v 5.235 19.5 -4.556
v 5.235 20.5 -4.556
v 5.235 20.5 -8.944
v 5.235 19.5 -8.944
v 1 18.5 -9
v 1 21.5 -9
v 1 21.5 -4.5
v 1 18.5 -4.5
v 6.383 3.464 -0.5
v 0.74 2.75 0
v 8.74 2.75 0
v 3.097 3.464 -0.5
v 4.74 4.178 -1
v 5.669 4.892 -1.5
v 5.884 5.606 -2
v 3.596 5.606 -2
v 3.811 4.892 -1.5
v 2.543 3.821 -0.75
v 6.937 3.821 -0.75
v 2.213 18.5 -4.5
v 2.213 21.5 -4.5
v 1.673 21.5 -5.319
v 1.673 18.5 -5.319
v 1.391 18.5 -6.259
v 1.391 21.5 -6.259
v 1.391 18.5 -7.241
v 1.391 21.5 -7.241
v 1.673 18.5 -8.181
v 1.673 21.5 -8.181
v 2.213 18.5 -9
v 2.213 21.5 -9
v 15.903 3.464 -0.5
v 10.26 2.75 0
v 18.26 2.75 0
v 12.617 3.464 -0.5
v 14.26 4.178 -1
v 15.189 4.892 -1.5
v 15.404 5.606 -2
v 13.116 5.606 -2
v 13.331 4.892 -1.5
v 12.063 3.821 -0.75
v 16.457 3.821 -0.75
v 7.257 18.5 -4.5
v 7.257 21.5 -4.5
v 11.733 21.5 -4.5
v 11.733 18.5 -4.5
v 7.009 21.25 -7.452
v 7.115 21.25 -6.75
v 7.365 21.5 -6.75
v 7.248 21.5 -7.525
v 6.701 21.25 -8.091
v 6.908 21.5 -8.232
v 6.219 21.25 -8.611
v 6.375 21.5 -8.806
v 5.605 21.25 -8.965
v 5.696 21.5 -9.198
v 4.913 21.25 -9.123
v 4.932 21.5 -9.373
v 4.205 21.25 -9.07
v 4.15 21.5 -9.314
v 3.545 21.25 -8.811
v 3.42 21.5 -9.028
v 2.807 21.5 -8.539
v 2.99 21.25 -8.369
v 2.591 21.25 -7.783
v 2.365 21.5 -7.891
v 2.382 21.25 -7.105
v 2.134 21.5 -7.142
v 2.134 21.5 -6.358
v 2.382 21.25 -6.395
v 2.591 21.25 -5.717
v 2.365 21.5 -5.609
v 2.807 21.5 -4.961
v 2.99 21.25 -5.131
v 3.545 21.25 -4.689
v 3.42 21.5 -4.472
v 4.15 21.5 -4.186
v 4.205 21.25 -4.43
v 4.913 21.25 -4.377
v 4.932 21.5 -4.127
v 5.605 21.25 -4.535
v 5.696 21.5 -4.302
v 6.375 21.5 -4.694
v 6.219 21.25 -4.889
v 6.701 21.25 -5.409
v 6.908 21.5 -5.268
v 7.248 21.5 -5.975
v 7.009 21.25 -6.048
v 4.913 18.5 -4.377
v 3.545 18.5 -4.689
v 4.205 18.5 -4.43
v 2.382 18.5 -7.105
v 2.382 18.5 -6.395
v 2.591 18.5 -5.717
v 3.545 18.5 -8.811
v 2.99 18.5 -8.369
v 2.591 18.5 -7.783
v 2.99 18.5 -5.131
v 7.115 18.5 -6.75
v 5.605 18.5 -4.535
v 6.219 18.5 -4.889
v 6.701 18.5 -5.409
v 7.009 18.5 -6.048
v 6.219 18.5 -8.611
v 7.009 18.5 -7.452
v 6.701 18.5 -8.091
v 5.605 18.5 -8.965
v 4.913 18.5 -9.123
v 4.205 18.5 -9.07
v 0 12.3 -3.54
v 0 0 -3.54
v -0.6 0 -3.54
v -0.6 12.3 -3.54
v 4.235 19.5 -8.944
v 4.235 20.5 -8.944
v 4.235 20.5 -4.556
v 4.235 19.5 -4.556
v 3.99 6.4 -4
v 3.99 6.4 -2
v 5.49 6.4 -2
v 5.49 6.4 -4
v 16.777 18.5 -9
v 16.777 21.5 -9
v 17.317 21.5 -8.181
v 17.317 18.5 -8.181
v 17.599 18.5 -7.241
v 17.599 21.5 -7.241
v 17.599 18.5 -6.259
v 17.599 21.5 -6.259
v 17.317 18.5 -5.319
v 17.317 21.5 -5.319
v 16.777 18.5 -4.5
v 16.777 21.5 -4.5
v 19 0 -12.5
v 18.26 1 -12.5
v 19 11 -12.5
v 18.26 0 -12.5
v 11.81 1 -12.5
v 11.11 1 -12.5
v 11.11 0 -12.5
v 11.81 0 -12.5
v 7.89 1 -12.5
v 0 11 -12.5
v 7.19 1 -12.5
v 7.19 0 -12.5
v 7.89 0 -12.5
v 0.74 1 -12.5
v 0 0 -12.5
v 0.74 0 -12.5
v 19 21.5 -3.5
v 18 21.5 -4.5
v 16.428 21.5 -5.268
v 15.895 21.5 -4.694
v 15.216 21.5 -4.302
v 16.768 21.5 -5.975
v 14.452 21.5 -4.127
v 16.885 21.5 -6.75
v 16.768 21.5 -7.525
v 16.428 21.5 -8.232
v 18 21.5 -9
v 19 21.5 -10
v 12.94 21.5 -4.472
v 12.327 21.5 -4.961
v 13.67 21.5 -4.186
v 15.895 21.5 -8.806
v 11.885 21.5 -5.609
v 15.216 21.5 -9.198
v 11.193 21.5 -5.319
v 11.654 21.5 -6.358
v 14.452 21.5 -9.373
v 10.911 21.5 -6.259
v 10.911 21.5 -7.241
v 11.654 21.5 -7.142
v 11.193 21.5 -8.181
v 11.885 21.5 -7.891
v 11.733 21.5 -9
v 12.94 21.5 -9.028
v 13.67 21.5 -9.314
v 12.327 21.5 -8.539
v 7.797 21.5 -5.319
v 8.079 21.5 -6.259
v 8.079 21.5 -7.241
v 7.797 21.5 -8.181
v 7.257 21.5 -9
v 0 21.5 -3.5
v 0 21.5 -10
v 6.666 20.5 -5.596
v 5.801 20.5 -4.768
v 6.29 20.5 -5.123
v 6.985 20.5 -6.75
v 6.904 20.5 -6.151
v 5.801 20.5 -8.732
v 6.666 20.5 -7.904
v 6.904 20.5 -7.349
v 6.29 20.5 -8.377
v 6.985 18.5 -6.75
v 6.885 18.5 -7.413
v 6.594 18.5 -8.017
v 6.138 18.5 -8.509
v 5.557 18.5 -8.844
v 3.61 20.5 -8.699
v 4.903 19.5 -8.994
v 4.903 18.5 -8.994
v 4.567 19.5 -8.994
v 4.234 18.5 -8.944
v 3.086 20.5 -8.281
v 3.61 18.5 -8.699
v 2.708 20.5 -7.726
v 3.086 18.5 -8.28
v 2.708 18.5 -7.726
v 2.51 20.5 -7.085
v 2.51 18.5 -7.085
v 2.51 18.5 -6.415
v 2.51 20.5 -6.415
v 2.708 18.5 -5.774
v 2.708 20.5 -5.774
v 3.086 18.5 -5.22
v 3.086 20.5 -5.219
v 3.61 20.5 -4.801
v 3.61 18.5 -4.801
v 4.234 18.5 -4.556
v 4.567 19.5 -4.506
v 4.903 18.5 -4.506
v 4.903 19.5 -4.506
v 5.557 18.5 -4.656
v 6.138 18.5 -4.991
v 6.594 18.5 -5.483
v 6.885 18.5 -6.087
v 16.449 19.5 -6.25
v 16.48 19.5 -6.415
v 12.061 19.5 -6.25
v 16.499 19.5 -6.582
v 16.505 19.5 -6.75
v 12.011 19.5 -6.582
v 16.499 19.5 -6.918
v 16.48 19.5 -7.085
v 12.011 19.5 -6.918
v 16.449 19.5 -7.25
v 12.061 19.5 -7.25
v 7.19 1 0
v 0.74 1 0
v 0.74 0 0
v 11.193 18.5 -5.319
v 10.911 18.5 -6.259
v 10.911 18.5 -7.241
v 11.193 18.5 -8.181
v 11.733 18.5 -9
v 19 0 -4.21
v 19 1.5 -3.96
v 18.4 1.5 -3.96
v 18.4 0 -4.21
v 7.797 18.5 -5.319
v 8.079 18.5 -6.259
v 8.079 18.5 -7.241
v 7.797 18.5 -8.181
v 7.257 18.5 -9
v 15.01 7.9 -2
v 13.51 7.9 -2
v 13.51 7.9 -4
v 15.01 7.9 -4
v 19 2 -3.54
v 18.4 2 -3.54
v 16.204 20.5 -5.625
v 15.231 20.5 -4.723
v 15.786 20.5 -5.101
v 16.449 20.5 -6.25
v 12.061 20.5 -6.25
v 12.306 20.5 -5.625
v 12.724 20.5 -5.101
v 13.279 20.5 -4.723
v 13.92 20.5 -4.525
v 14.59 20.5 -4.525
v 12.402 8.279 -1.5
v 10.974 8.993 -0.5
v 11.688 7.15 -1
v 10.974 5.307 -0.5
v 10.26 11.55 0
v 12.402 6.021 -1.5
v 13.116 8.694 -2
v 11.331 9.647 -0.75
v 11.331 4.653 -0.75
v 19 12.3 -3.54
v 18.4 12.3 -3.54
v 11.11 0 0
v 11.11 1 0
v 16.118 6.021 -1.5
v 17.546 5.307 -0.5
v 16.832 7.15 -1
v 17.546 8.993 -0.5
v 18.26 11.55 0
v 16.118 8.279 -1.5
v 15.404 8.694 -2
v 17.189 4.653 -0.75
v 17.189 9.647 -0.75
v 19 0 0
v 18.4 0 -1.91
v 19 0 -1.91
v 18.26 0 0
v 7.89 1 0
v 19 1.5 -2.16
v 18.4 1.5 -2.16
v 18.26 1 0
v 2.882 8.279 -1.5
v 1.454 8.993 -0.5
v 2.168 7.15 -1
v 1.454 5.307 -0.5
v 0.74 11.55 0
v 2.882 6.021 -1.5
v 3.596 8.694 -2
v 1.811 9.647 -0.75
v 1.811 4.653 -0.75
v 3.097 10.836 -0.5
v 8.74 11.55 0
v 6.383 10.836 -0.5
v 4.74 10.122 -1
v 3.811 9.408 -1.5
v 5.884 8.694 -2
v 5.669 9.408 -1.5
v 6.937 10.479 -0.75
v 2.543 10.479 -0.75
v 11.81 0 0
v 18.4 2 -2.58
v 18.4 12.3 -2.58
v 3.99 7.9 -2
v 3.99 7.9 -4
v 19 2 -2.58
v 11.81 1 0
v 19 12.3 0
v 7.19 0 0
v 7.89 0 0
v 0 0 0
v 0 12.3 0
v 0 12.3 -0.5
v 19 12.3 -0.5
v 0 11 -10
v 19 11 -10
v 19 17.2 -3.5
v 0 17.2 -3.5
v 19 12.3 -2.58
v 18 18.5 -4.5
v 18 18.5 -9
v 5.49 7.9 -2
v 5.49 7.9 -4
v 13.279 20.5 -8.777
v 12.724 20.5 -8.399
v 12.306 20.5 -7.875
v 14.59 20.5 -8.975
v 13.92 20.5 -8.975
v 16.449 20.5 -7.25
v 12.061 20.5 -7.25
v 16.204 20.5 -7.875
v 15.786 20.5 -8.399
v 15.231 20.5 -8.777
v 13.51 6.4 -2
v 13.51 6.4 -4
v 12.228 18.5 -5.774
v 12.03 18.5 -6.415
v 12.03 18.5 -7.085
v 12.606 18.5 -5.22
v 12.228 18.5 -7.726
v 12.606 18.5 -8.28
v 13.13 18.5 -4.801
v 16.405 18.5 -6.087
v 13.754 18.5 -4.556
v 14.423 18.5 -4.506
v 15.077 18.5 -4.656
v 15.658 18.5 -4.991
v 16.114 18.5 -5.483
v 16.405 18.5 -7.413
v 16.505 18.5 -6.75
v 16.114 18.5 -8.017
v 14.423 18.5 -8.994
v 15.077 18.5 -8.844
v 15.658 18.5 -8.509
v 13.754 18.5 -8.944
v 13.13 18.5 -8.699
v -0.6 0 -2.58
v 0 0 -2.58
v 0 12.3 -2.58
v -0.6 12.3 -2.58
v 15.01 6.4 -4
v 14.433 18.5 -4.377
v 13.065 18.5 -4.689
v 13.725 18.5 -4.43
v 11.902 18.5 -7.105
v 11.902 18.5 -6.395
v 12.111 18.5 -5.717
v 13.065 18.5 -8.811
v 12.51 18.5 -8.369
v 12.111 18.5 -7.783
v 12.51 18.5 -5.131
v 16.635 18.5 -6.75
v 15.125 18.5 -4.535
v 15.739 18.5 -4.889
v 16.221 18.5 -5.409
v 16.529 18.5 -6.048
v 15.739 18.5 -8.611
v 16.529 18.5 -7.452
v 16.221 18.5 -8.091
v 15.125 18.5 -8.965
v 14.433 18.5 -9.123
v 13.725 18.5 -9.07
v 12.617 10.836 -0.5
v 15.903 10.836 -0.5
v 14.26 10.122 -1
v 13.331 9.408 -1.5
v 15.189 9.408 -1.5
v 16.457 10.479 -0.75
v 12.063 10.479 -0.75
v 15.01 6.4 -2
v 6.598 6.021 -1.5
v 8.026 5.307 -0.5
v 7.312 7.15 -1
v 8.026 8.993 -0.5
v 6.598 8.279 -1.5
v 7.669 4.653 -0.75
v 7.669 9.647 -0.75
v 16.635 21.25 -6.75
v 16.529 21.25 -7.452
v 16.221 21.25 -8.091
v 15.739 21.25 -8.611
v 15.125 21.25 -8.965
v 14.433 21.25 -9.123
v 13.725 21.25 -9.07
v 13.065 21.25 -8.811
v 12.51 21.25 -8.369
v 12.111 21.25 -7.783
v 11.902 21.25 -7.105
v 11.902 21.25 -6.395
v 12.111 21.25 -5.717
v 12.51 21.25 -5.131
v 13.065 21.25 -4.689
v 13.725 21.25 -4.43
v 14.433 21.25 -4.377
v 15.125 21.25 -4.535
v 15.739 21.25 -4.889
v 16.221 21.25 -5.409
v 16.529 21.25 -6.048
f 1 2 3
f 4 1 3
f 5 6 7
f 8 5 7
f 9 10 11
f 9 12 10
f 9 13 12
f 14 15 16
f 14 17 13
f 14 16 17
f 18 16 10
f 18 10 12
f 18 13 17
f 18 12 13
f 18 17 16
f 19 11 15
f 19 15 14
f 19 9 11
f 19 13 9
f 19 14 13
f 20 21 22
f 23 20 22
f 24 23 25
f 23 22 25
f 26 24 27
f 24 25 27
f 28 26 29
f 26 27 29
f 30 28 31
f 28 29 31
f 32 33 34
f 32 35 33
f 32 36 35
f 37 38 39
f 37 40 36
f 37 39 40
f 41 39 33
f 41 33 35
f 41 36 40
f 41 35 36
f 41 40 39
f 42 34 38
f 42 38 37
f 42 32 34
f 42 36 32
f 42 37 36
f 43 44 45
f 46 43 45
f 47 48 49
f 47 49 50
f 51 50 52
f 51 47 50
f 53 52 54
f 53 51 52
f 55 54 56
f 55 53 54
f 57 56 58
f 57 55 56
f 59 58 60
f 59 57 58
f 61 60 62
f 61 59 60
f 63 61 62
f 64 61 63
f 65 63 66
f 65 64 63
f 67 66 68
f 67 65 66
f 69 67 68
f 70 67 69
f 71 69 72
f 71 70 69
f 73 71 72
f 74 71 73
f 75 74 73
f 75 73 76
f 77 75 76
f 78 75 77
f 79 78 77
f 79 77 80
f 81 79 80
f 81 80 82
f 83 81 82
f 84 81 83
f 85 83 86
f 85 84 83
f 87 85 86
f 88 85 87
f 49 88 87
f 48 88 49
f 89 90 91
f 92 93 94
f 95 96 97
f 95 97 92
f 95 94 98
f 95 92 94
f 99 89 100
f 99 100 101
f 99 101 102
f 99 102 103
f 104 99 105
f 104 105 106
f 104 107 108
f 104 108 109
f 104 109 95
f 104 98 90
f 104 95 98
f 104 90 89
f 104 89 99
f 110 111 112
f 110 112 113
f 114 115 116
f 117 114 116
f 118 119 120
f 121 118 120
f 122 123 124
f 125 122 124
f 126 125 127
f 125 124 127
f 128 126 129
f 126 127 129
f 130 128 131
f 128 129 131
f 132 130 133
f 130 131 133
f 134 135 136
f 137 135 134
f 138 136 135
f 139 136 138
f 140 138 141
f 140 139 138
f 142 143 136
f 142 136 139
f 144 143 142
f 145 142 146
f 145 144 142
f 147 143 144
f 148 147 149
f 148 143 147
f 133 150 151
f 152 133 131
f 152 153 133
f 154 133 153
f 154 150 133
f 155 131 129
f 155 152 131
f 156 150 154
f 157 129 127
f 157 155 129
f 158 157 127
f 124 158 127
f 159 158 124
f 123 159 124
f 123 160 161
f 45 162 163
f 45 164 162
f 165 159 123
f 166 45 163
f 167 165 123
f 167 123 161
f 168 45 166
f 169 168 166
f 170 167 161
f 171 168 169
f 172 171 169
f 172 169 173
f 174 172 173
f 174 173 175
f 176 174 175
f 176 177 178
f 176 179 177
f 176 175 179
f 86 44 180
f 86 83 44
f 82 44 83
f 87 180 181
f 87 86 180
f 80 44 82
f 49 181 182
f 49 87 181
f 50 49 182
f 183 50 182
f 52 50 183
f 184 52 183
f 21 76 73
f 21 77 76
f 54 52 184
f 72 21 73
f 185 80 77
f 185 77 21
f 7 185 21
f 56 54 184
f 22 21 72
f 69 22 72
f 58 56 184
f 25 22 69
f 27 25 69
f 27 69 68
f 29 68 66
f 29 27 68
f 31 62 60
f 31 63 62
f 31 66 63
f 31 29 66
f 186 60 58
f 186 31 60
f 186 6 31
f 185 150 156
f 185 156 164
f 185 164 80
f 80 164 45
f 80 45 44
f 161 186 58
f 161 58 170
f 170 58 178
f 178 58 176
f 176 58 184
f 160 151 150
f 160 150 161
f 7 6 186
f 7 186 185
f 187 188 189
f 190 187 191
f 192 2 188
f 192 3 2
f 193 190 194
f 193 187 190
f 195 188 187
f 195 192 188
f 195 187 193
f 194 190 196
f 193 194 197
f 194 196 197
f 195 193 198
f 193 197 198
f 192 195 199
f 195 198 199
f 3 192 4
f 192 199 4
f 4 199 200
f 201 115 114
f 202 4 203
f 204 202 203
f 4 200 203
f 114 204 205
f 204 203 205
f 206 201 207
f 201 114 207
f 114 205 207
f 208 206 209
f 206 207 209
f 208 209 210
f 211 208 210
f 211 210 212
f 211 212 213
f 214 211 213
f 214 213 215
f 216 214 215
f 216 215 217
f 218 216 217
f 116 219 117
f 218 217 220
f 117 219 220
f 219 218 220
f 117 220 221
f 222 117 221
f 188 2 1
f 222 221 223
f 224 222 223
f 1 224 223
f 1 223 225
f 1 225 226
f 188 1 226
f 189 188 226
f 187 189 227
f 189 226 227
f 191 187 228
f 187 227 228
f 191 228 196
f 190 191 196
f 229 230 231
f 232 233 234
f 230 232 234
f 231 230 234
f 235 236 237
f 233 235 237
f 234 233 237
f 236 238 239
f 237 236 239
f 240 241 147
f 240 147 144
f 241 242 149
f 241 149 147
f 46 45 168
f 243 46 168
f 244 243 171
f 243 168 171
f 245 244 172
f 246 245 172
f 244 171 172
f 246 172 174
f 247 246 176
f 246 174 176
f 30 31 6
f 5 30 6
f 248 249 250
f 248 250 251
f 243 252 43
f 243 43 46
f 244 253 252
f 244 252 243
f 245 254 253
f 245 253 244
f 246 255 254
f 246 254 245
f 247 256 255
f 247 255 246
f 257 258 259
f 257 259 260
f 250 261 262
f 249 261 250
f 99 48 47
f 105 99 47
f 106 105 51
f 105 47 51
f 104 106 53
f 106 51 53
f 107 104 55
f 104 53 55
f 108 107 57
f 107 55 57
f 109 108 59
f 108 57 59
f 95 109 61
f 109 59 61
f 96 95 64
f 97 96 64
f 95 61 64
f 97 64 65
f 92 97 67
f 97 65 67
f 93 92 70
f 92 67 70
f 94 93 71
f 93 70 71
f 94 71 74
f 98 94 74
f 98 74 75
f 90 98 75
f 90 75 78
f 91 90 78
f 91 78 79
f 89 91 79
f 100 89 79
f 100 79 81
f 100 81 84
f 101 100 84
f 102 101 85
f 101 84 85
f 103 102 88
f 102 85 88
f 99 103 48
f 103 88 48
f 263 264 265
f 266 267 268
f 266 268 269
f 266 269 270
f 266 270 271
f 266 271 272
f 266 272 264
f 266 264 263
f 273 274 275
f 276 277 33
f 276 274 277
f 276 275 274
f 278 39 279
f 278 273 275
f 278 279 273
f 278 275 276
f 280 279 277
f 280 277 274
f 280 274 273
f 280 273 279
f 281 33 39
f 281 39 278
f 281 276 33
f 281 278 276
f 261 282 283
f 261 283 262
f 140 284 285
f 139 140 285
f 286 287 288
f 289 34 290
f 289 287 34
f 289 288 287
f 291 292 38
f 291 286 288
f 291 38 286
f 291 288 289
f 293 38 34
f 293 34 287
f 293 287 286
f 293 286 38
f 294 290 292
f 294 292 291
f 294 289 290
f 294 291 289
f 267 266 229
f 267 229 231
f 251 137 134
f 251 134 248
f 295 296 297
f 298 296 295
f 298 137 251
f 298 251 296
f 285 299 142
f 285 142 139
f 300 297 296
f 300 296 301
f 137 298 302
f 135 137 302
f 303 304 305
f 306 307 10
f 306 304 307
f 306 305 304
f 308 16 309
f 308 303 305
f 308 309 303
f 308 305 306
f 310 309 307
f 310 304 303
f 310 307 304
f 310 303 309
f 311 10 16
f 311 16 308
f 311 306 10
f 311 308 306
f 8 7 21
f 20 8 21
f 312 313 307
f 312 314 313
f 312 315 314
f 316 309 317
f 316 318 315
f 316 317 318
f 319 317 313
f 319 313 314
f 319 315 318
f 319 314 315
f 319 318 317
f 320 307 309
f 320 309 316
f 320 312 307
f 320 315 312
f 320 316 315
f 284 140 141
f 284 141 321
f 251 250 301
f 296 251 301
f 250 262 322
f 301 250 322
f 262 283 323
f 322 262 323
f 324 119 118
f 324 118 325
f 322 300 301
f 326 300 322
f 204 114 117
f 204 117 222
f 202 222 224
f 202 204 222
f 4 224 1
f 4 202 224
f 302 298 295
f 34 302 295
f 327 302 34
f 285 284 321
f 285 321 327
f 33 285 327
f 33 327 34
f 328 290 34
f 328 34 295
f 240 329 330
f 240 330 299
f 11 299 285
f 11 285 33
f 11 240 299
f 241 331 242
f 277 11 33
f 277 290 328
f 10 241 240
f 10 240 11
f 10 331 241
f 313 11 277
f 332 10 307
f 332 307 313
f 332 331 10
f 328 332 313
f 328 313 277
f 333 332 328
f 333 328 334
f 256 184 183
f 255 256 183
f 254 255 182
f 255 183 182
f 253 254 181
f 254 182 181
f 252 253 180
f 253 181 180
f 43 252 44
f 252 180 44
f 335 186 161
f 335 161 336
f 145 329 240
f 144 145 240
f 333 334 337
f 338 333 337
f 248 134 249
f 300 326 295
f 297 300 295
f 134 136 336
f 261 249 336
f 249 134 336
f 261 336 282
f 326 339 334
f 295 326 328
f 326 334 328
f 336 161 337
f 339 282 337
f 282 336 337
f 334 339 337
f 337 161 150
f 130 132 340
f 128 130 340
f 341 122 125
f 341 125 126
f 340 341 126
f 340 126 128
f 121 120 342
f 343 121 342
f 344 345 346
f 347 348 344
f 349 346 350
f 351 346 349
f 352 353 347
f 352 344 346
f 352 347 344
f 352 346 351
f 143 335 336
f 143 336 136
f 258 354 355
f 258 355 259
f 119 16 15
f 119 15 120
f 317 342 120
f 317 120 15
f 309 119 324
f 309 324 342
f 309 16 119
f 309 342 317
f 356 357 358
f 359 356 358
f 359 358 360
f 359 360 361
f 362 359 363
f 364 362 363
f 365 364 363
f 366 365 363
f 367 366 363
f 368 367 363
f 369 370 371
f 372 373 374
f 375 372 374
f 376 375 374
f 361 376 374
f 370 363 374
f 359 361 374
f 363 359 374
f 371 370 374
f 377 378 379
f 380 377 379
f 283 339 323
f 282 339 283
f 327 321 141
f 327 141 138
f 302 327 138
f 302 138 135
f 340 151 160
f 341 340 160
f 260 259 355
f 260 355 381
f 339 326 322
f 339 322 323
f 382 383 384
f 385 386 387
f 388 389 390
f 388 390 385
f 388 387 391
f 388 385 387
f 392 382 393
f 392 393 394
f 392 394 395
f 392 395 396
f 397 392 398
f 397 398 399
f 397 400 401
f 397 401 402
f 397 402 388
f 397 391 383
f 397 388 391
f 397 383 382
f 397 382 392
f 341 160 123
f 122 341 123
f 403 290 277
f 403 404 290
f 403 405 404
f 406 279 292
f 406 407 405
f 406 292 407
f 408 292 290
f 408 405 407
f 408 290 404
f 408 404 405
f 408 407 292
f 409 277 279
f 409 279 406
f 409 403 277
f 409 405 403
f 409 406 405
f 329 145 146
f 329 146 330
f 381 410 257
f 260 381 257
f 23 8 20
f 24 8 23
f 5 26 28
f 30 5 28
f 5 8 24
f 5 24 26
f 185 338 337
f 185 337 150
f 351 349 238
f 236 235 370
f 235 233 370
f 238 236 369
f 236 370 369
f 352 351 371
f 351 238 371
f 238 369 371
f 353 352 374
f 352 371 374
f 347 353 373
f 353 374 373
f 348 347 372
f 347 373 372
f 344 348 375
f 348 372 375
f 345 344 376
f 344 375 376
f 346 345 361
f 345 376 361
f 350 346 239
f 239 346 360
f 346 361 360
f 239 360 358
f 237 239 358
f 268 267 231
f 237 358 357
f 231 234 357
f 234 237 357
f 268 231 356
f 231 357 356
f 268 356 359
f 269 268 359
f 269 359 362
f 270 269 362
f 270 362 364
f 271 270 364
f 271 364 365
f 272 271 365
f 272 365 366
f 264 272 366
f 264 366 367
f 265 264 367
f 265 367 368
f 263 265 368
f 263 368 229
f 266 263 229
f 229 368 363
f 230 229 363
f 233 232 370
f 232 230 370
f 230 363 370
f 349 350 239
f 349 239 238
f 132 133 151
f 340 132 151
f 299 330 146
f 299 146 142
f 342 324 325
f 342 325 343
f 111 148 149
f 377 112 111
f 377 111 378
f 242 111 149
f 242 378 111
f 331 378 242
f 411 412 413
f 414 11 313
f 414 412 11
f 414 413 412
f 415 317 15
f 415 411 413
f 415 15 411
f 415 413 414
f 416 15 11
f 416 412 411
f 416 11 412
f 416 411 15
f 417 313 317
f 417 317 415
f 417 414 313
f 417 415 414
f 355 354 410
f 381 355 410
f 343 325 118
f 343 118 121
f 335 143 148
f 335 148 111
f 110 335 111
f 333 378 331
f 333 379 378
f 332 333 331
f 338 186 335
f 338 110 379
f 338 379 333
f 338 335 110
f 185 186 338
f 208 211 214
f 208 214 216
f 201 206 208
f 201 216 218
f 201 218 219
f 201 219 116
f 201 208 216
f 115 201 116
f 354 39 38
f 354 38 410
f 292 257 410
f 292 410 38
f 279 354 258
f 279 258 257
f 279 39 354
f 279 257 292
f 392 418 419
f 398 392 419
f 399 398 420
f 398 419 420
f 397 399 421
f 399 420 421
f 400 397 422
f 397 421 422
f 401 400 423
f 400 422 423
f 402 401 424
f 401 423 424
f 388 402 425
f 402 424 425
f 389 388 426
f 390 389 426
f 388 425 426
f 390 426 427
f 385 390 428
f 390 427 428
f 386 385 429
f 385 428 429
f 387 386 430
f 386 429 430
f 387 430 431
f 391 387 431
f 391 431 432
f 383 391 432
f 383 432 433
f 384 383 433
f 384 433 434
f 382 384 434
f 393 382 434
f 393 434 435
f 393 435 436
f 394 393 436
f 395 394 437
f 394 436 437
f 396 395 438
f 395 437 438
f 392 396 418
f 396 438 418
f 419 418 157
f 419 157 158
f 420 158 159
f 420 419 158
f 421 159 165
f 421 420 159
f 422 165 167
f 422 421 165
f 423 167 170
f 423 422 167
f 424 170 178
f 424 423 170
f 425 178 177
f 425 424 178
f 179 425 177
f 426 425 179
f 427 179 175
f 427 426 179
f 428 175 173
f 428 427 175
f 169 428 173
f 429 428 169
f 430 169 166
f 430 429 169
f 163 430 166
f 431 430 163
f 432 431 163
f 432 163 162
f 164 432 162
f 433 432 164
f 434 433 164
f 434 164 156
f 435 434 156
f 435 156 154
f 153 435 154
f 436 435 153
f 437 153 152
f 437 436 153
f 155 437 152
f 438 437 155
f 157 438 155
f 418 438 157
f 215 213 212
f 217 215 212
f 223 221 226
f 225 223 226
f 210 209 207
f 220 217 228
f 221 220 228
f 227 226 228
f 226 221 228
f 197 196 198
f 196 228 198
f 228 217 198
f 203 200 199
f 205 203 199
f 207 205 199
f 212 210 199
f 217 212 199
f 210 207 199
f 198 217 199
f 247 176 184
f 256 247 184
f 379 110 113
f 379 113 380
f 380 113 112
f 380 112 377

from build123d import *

# Parameters (mm, degrees)
BOSS_EXTRUDE1_DEPTH   = 19
SKETCH2_R             = 2.38
CUT_EXTRUDE1_DEPTH    = 3
CUT_EXTRUDE2_DEPTH    = 0.6
SKETCH4_W             = 0.96
SKETCH4_H             = 12.3
BOSS_EXTRUDE2_DEPTH   = 0.6
CHAMFER1_SIZE         = 0.25
SKETCH6_R             = 2.25
BOSS_EXTRUDE3_DEPTH   = 2
BOSS_EXTRUDE3_2_DEPTH = 2
CUT_EXTRUDE3_DEPTH    = 1
SKETCH8_W             = 8
SKETCH8_H             = 8.8
CUT_EXTRUDE4_DEPTH    = 2
CUT_EXTRUDE4_TAPER    = 55
SKETCH9_W             = 1.5
SKETCH9_H             = 1.5
CUT_EXTRUDE5_DEPTH    = 2
SKETCH10_W            = 6.45
SKETCH10_H            = 1
SKETCH10_W_2          = 3.22
CUT_EXTRUDE6_DEPTH    = 13.5


with BuildPart() as part:
    # Sketch1 → Boss-Extrude1 (new body)
    with BuildSketch(Plane(origin=(0, 0, 0), x_dir=(0, 0, -1), z_dir=(1, 0, 0))):
        Polygon((0, 0), (0, 12.3), (0.5, 12.3), (3.5, 17.2), (3.5, 21.5), (10, 21.5), (10, 11), (12.5, 11), (12.5, 0), align=None)
    extrude(amount=BOSS_EXTRUDE1_DEPTH)

    # Sketch2 → Cut-Extrude1 (cut)
    with BuildSketch(Plane(origin=(0, 21.5, 0), x_dir=(1, 0, 0), z_dir=(0, 1, 0))):
        with Locations((4.735, 6.75)):
            Circle(SKETCH2_R)
        with Locations((14.255, 6.75)):
            Circle(SKETCH2_R)
        with BuildLine():
            Line((16.777280714, 4.5), (18, 4.5))
            Line((18, 4.5), (18, 9))
            Line((18, 9), (16.777280714, 9))
            ThreePointArc((16.777280714, 9), (17.635, 6.75), (16.777280714, 4.5))
        make_face()
        with BuildLine():
            Line((11.732719286, 9), (7.257280714, 9))
            ThreePointArc((7.257280714, 9), (8.115, 6.75), (7.257280714, 4.5))
            Line((7.257280714, 4.5), (11.732719286, 4.5))
            ThreePointArc((11.732719286, 4.5), (10.875, 6.75), (11.732719286, 9))
        make_face()
        with BuildLine():
            Line((1, 9), (1, 4.5))
            Line((1, 4.5), (2.212719286, 4.5))
            ThreePointArc((2.212719286, 4.5), (1.355, 6.75), (2.212719286, 9))
            Line((2.212719286, 9), (1, 9))
        make_face()
    extrude(amount=-CUT_EXTRUDE1_DEPTH, mode=Mode.SUBTRACT)

    # Sketch3 → Cut-Extrude2 (cut)
    with BuildSketch(Plane(origin=(19, 0, 0), x_dir=(0, 0, -1), z_dir=(1, 0, 0))):
        Polygon((1.91, 0), (2.16, 1.5), (2.58, 2), (2.58, 12.3), (3.54, 12.3), (3.54, 2), (3.96, 1.5), (4.21, 0), align=None)
    extrude(amount=-CUT_EXTRUDE2_DEPTH, mode=Mode.SUBTRACT)

    # Sketch4 → Boss-Extrude2 (add)
    with BuildSketch(Plane.ZY):
        with Locations((-3.06, 6.15)):
            Rectangle(SKETCH4_W, SKETCH4_H)
    extrude(amount=BOSS_EXTRUDE2_DEPTH)

    # Chamfer1
    chamfer1_edges = [part.edges().sort_by_distance(p)[0] for p in [
        (2.355, 21.5, -6.75),
        (11.875, 21.5, -6.75),
    ]]
    chamfer(chamfer1_edges, length=CHAMFER1_SIZE)

    # Sketch8 → Cut-Extrude4 (cut)
    with BuildSketch(Plane.XY):
        with Locations((14.26, 7.15)):
            Rectangle(SKETCH8_W, SKETCH8_H)
        with Locations((4.74, 7.15)):
            Rectangle(SKETCH8_W, SKETCH8_H)
    extrude(amount=-CUT_EXTRUDE4_DEPTH, taper=CUT_EXTRUDE4_TAPER, mode=Mode.SUBTRACT)

    # Sketch9 → Cut-Extrude5 (cut)
    with BuildSketch(Plane.XY.offset(-2)):
        with Locations((4.74, 7.15)):
            Rectangle(SKETCH9_W, SKETCH9_H)
        with Locations((14.26, 7.15)):
            Rectangle(SKETCH9_W, SKETCH9_H)
    extrude(amount=-CUT_EXTRUDE5_DEPTH, mode=Mode.SUBTRACT)

    # Sketch10 → Cut-Extrude6 (cut, through all)
    with BuildSketch(Plane.XY):
        with Locations((3.965, 0.5)):
            Rectangle(SKETCH10_W, SKETCH10_H)
        with Locations((9.5, 0.5)):
            Rectangle(SKETCH10_W_2, SKETCH10_H)
        with Locations((15.035, 0.5)):
            Rectangle(SKETCH10_W, SKETCH10_H)
    extrude(amount=-CUT_EXTRUDE6_DEPTH, mode=Mode.SUBTRACT)


with BuildPart() as body_2:
    # Sketch6 → Boss-Extrude3 (new body)
    with BuildSketch(Plane(origin=(0, 18.5, 0), x_dir=(1, 0, 0), z_dir=(0, 1, 0))):
        with Locations((14.255, 6.75)):
            Circle(SKETCH6_R)
    extrude(amount=BOSS_EXTRUDE3_DEPTH)


with BuildPart() as body_3:
    # Sketch6 → Boss-Extrude3 2 (new body)
    with BuildSketch(Plane(origin=(0, 18.5, 0), x_dir=(1, 0, 0), z_dir=(0, 1, 0))):
        with Locations((4.735, 6.75)):
            Circle(SKETCH6_R)
    extrude(amount=BOSS_EXTRUDE3_2_DEPTH)


with BuildPart() as cut_extrude3_tool:
    # Sketch7 → Cut-Extrude3 (new body)
    with BuildSketch(Plane(origin=(0, 20.5, 0), x_dir=(1, 0, 0), z_dir=(0, 1, 0))):
        with BuildLine():
            Line((4.235, 8.943741097), (4.235, 4.556258903))
            ThreePointArc((4.235, 4.556258903), (4.735, 4.5), (5.235, 4.556258903))
            Line((5.235, 4.556258903), (5.235, 8.943741097))
            ThreePointArc((5.235, 8.943741097), (4.735, 9), (4.235, 8.943741097))
        make_face()
        with BuildLine():
            Line((12.061258903, 7.25), (16.448741097, 7.25))
            ThreePointArc((16.448741097, 7.25), (16.505, 6.75), (16.448741097, 6.25))
            Line((16.448741097, 6.25), (12.061258903, 6.25))
            ThreePointArc((12.061258903, 6.25), (12.005, 6.75), (12.061258903, 7.25))
        make_face()
    extrude(amount=-CUT_EXTRUDE3_DEPTH)


with BuildPart() as body_2_1:
    add(body_2.part)

    # Cut-Extrude3: cut by cut_extrude3_tool
    add(cut_extrude3_tool.part, mode=Mode.SUBTRACT)


with BuildPart() as body_3_1:
    add(body_3.part)

    # Cut-Extrude3: cut by cut_extrude3_tool
    add(cut_extrude3_tool.part, mode=Mode.SUBTRACT)


solid = Compound([part.part, body_2_1.part, body_3_1.part])
